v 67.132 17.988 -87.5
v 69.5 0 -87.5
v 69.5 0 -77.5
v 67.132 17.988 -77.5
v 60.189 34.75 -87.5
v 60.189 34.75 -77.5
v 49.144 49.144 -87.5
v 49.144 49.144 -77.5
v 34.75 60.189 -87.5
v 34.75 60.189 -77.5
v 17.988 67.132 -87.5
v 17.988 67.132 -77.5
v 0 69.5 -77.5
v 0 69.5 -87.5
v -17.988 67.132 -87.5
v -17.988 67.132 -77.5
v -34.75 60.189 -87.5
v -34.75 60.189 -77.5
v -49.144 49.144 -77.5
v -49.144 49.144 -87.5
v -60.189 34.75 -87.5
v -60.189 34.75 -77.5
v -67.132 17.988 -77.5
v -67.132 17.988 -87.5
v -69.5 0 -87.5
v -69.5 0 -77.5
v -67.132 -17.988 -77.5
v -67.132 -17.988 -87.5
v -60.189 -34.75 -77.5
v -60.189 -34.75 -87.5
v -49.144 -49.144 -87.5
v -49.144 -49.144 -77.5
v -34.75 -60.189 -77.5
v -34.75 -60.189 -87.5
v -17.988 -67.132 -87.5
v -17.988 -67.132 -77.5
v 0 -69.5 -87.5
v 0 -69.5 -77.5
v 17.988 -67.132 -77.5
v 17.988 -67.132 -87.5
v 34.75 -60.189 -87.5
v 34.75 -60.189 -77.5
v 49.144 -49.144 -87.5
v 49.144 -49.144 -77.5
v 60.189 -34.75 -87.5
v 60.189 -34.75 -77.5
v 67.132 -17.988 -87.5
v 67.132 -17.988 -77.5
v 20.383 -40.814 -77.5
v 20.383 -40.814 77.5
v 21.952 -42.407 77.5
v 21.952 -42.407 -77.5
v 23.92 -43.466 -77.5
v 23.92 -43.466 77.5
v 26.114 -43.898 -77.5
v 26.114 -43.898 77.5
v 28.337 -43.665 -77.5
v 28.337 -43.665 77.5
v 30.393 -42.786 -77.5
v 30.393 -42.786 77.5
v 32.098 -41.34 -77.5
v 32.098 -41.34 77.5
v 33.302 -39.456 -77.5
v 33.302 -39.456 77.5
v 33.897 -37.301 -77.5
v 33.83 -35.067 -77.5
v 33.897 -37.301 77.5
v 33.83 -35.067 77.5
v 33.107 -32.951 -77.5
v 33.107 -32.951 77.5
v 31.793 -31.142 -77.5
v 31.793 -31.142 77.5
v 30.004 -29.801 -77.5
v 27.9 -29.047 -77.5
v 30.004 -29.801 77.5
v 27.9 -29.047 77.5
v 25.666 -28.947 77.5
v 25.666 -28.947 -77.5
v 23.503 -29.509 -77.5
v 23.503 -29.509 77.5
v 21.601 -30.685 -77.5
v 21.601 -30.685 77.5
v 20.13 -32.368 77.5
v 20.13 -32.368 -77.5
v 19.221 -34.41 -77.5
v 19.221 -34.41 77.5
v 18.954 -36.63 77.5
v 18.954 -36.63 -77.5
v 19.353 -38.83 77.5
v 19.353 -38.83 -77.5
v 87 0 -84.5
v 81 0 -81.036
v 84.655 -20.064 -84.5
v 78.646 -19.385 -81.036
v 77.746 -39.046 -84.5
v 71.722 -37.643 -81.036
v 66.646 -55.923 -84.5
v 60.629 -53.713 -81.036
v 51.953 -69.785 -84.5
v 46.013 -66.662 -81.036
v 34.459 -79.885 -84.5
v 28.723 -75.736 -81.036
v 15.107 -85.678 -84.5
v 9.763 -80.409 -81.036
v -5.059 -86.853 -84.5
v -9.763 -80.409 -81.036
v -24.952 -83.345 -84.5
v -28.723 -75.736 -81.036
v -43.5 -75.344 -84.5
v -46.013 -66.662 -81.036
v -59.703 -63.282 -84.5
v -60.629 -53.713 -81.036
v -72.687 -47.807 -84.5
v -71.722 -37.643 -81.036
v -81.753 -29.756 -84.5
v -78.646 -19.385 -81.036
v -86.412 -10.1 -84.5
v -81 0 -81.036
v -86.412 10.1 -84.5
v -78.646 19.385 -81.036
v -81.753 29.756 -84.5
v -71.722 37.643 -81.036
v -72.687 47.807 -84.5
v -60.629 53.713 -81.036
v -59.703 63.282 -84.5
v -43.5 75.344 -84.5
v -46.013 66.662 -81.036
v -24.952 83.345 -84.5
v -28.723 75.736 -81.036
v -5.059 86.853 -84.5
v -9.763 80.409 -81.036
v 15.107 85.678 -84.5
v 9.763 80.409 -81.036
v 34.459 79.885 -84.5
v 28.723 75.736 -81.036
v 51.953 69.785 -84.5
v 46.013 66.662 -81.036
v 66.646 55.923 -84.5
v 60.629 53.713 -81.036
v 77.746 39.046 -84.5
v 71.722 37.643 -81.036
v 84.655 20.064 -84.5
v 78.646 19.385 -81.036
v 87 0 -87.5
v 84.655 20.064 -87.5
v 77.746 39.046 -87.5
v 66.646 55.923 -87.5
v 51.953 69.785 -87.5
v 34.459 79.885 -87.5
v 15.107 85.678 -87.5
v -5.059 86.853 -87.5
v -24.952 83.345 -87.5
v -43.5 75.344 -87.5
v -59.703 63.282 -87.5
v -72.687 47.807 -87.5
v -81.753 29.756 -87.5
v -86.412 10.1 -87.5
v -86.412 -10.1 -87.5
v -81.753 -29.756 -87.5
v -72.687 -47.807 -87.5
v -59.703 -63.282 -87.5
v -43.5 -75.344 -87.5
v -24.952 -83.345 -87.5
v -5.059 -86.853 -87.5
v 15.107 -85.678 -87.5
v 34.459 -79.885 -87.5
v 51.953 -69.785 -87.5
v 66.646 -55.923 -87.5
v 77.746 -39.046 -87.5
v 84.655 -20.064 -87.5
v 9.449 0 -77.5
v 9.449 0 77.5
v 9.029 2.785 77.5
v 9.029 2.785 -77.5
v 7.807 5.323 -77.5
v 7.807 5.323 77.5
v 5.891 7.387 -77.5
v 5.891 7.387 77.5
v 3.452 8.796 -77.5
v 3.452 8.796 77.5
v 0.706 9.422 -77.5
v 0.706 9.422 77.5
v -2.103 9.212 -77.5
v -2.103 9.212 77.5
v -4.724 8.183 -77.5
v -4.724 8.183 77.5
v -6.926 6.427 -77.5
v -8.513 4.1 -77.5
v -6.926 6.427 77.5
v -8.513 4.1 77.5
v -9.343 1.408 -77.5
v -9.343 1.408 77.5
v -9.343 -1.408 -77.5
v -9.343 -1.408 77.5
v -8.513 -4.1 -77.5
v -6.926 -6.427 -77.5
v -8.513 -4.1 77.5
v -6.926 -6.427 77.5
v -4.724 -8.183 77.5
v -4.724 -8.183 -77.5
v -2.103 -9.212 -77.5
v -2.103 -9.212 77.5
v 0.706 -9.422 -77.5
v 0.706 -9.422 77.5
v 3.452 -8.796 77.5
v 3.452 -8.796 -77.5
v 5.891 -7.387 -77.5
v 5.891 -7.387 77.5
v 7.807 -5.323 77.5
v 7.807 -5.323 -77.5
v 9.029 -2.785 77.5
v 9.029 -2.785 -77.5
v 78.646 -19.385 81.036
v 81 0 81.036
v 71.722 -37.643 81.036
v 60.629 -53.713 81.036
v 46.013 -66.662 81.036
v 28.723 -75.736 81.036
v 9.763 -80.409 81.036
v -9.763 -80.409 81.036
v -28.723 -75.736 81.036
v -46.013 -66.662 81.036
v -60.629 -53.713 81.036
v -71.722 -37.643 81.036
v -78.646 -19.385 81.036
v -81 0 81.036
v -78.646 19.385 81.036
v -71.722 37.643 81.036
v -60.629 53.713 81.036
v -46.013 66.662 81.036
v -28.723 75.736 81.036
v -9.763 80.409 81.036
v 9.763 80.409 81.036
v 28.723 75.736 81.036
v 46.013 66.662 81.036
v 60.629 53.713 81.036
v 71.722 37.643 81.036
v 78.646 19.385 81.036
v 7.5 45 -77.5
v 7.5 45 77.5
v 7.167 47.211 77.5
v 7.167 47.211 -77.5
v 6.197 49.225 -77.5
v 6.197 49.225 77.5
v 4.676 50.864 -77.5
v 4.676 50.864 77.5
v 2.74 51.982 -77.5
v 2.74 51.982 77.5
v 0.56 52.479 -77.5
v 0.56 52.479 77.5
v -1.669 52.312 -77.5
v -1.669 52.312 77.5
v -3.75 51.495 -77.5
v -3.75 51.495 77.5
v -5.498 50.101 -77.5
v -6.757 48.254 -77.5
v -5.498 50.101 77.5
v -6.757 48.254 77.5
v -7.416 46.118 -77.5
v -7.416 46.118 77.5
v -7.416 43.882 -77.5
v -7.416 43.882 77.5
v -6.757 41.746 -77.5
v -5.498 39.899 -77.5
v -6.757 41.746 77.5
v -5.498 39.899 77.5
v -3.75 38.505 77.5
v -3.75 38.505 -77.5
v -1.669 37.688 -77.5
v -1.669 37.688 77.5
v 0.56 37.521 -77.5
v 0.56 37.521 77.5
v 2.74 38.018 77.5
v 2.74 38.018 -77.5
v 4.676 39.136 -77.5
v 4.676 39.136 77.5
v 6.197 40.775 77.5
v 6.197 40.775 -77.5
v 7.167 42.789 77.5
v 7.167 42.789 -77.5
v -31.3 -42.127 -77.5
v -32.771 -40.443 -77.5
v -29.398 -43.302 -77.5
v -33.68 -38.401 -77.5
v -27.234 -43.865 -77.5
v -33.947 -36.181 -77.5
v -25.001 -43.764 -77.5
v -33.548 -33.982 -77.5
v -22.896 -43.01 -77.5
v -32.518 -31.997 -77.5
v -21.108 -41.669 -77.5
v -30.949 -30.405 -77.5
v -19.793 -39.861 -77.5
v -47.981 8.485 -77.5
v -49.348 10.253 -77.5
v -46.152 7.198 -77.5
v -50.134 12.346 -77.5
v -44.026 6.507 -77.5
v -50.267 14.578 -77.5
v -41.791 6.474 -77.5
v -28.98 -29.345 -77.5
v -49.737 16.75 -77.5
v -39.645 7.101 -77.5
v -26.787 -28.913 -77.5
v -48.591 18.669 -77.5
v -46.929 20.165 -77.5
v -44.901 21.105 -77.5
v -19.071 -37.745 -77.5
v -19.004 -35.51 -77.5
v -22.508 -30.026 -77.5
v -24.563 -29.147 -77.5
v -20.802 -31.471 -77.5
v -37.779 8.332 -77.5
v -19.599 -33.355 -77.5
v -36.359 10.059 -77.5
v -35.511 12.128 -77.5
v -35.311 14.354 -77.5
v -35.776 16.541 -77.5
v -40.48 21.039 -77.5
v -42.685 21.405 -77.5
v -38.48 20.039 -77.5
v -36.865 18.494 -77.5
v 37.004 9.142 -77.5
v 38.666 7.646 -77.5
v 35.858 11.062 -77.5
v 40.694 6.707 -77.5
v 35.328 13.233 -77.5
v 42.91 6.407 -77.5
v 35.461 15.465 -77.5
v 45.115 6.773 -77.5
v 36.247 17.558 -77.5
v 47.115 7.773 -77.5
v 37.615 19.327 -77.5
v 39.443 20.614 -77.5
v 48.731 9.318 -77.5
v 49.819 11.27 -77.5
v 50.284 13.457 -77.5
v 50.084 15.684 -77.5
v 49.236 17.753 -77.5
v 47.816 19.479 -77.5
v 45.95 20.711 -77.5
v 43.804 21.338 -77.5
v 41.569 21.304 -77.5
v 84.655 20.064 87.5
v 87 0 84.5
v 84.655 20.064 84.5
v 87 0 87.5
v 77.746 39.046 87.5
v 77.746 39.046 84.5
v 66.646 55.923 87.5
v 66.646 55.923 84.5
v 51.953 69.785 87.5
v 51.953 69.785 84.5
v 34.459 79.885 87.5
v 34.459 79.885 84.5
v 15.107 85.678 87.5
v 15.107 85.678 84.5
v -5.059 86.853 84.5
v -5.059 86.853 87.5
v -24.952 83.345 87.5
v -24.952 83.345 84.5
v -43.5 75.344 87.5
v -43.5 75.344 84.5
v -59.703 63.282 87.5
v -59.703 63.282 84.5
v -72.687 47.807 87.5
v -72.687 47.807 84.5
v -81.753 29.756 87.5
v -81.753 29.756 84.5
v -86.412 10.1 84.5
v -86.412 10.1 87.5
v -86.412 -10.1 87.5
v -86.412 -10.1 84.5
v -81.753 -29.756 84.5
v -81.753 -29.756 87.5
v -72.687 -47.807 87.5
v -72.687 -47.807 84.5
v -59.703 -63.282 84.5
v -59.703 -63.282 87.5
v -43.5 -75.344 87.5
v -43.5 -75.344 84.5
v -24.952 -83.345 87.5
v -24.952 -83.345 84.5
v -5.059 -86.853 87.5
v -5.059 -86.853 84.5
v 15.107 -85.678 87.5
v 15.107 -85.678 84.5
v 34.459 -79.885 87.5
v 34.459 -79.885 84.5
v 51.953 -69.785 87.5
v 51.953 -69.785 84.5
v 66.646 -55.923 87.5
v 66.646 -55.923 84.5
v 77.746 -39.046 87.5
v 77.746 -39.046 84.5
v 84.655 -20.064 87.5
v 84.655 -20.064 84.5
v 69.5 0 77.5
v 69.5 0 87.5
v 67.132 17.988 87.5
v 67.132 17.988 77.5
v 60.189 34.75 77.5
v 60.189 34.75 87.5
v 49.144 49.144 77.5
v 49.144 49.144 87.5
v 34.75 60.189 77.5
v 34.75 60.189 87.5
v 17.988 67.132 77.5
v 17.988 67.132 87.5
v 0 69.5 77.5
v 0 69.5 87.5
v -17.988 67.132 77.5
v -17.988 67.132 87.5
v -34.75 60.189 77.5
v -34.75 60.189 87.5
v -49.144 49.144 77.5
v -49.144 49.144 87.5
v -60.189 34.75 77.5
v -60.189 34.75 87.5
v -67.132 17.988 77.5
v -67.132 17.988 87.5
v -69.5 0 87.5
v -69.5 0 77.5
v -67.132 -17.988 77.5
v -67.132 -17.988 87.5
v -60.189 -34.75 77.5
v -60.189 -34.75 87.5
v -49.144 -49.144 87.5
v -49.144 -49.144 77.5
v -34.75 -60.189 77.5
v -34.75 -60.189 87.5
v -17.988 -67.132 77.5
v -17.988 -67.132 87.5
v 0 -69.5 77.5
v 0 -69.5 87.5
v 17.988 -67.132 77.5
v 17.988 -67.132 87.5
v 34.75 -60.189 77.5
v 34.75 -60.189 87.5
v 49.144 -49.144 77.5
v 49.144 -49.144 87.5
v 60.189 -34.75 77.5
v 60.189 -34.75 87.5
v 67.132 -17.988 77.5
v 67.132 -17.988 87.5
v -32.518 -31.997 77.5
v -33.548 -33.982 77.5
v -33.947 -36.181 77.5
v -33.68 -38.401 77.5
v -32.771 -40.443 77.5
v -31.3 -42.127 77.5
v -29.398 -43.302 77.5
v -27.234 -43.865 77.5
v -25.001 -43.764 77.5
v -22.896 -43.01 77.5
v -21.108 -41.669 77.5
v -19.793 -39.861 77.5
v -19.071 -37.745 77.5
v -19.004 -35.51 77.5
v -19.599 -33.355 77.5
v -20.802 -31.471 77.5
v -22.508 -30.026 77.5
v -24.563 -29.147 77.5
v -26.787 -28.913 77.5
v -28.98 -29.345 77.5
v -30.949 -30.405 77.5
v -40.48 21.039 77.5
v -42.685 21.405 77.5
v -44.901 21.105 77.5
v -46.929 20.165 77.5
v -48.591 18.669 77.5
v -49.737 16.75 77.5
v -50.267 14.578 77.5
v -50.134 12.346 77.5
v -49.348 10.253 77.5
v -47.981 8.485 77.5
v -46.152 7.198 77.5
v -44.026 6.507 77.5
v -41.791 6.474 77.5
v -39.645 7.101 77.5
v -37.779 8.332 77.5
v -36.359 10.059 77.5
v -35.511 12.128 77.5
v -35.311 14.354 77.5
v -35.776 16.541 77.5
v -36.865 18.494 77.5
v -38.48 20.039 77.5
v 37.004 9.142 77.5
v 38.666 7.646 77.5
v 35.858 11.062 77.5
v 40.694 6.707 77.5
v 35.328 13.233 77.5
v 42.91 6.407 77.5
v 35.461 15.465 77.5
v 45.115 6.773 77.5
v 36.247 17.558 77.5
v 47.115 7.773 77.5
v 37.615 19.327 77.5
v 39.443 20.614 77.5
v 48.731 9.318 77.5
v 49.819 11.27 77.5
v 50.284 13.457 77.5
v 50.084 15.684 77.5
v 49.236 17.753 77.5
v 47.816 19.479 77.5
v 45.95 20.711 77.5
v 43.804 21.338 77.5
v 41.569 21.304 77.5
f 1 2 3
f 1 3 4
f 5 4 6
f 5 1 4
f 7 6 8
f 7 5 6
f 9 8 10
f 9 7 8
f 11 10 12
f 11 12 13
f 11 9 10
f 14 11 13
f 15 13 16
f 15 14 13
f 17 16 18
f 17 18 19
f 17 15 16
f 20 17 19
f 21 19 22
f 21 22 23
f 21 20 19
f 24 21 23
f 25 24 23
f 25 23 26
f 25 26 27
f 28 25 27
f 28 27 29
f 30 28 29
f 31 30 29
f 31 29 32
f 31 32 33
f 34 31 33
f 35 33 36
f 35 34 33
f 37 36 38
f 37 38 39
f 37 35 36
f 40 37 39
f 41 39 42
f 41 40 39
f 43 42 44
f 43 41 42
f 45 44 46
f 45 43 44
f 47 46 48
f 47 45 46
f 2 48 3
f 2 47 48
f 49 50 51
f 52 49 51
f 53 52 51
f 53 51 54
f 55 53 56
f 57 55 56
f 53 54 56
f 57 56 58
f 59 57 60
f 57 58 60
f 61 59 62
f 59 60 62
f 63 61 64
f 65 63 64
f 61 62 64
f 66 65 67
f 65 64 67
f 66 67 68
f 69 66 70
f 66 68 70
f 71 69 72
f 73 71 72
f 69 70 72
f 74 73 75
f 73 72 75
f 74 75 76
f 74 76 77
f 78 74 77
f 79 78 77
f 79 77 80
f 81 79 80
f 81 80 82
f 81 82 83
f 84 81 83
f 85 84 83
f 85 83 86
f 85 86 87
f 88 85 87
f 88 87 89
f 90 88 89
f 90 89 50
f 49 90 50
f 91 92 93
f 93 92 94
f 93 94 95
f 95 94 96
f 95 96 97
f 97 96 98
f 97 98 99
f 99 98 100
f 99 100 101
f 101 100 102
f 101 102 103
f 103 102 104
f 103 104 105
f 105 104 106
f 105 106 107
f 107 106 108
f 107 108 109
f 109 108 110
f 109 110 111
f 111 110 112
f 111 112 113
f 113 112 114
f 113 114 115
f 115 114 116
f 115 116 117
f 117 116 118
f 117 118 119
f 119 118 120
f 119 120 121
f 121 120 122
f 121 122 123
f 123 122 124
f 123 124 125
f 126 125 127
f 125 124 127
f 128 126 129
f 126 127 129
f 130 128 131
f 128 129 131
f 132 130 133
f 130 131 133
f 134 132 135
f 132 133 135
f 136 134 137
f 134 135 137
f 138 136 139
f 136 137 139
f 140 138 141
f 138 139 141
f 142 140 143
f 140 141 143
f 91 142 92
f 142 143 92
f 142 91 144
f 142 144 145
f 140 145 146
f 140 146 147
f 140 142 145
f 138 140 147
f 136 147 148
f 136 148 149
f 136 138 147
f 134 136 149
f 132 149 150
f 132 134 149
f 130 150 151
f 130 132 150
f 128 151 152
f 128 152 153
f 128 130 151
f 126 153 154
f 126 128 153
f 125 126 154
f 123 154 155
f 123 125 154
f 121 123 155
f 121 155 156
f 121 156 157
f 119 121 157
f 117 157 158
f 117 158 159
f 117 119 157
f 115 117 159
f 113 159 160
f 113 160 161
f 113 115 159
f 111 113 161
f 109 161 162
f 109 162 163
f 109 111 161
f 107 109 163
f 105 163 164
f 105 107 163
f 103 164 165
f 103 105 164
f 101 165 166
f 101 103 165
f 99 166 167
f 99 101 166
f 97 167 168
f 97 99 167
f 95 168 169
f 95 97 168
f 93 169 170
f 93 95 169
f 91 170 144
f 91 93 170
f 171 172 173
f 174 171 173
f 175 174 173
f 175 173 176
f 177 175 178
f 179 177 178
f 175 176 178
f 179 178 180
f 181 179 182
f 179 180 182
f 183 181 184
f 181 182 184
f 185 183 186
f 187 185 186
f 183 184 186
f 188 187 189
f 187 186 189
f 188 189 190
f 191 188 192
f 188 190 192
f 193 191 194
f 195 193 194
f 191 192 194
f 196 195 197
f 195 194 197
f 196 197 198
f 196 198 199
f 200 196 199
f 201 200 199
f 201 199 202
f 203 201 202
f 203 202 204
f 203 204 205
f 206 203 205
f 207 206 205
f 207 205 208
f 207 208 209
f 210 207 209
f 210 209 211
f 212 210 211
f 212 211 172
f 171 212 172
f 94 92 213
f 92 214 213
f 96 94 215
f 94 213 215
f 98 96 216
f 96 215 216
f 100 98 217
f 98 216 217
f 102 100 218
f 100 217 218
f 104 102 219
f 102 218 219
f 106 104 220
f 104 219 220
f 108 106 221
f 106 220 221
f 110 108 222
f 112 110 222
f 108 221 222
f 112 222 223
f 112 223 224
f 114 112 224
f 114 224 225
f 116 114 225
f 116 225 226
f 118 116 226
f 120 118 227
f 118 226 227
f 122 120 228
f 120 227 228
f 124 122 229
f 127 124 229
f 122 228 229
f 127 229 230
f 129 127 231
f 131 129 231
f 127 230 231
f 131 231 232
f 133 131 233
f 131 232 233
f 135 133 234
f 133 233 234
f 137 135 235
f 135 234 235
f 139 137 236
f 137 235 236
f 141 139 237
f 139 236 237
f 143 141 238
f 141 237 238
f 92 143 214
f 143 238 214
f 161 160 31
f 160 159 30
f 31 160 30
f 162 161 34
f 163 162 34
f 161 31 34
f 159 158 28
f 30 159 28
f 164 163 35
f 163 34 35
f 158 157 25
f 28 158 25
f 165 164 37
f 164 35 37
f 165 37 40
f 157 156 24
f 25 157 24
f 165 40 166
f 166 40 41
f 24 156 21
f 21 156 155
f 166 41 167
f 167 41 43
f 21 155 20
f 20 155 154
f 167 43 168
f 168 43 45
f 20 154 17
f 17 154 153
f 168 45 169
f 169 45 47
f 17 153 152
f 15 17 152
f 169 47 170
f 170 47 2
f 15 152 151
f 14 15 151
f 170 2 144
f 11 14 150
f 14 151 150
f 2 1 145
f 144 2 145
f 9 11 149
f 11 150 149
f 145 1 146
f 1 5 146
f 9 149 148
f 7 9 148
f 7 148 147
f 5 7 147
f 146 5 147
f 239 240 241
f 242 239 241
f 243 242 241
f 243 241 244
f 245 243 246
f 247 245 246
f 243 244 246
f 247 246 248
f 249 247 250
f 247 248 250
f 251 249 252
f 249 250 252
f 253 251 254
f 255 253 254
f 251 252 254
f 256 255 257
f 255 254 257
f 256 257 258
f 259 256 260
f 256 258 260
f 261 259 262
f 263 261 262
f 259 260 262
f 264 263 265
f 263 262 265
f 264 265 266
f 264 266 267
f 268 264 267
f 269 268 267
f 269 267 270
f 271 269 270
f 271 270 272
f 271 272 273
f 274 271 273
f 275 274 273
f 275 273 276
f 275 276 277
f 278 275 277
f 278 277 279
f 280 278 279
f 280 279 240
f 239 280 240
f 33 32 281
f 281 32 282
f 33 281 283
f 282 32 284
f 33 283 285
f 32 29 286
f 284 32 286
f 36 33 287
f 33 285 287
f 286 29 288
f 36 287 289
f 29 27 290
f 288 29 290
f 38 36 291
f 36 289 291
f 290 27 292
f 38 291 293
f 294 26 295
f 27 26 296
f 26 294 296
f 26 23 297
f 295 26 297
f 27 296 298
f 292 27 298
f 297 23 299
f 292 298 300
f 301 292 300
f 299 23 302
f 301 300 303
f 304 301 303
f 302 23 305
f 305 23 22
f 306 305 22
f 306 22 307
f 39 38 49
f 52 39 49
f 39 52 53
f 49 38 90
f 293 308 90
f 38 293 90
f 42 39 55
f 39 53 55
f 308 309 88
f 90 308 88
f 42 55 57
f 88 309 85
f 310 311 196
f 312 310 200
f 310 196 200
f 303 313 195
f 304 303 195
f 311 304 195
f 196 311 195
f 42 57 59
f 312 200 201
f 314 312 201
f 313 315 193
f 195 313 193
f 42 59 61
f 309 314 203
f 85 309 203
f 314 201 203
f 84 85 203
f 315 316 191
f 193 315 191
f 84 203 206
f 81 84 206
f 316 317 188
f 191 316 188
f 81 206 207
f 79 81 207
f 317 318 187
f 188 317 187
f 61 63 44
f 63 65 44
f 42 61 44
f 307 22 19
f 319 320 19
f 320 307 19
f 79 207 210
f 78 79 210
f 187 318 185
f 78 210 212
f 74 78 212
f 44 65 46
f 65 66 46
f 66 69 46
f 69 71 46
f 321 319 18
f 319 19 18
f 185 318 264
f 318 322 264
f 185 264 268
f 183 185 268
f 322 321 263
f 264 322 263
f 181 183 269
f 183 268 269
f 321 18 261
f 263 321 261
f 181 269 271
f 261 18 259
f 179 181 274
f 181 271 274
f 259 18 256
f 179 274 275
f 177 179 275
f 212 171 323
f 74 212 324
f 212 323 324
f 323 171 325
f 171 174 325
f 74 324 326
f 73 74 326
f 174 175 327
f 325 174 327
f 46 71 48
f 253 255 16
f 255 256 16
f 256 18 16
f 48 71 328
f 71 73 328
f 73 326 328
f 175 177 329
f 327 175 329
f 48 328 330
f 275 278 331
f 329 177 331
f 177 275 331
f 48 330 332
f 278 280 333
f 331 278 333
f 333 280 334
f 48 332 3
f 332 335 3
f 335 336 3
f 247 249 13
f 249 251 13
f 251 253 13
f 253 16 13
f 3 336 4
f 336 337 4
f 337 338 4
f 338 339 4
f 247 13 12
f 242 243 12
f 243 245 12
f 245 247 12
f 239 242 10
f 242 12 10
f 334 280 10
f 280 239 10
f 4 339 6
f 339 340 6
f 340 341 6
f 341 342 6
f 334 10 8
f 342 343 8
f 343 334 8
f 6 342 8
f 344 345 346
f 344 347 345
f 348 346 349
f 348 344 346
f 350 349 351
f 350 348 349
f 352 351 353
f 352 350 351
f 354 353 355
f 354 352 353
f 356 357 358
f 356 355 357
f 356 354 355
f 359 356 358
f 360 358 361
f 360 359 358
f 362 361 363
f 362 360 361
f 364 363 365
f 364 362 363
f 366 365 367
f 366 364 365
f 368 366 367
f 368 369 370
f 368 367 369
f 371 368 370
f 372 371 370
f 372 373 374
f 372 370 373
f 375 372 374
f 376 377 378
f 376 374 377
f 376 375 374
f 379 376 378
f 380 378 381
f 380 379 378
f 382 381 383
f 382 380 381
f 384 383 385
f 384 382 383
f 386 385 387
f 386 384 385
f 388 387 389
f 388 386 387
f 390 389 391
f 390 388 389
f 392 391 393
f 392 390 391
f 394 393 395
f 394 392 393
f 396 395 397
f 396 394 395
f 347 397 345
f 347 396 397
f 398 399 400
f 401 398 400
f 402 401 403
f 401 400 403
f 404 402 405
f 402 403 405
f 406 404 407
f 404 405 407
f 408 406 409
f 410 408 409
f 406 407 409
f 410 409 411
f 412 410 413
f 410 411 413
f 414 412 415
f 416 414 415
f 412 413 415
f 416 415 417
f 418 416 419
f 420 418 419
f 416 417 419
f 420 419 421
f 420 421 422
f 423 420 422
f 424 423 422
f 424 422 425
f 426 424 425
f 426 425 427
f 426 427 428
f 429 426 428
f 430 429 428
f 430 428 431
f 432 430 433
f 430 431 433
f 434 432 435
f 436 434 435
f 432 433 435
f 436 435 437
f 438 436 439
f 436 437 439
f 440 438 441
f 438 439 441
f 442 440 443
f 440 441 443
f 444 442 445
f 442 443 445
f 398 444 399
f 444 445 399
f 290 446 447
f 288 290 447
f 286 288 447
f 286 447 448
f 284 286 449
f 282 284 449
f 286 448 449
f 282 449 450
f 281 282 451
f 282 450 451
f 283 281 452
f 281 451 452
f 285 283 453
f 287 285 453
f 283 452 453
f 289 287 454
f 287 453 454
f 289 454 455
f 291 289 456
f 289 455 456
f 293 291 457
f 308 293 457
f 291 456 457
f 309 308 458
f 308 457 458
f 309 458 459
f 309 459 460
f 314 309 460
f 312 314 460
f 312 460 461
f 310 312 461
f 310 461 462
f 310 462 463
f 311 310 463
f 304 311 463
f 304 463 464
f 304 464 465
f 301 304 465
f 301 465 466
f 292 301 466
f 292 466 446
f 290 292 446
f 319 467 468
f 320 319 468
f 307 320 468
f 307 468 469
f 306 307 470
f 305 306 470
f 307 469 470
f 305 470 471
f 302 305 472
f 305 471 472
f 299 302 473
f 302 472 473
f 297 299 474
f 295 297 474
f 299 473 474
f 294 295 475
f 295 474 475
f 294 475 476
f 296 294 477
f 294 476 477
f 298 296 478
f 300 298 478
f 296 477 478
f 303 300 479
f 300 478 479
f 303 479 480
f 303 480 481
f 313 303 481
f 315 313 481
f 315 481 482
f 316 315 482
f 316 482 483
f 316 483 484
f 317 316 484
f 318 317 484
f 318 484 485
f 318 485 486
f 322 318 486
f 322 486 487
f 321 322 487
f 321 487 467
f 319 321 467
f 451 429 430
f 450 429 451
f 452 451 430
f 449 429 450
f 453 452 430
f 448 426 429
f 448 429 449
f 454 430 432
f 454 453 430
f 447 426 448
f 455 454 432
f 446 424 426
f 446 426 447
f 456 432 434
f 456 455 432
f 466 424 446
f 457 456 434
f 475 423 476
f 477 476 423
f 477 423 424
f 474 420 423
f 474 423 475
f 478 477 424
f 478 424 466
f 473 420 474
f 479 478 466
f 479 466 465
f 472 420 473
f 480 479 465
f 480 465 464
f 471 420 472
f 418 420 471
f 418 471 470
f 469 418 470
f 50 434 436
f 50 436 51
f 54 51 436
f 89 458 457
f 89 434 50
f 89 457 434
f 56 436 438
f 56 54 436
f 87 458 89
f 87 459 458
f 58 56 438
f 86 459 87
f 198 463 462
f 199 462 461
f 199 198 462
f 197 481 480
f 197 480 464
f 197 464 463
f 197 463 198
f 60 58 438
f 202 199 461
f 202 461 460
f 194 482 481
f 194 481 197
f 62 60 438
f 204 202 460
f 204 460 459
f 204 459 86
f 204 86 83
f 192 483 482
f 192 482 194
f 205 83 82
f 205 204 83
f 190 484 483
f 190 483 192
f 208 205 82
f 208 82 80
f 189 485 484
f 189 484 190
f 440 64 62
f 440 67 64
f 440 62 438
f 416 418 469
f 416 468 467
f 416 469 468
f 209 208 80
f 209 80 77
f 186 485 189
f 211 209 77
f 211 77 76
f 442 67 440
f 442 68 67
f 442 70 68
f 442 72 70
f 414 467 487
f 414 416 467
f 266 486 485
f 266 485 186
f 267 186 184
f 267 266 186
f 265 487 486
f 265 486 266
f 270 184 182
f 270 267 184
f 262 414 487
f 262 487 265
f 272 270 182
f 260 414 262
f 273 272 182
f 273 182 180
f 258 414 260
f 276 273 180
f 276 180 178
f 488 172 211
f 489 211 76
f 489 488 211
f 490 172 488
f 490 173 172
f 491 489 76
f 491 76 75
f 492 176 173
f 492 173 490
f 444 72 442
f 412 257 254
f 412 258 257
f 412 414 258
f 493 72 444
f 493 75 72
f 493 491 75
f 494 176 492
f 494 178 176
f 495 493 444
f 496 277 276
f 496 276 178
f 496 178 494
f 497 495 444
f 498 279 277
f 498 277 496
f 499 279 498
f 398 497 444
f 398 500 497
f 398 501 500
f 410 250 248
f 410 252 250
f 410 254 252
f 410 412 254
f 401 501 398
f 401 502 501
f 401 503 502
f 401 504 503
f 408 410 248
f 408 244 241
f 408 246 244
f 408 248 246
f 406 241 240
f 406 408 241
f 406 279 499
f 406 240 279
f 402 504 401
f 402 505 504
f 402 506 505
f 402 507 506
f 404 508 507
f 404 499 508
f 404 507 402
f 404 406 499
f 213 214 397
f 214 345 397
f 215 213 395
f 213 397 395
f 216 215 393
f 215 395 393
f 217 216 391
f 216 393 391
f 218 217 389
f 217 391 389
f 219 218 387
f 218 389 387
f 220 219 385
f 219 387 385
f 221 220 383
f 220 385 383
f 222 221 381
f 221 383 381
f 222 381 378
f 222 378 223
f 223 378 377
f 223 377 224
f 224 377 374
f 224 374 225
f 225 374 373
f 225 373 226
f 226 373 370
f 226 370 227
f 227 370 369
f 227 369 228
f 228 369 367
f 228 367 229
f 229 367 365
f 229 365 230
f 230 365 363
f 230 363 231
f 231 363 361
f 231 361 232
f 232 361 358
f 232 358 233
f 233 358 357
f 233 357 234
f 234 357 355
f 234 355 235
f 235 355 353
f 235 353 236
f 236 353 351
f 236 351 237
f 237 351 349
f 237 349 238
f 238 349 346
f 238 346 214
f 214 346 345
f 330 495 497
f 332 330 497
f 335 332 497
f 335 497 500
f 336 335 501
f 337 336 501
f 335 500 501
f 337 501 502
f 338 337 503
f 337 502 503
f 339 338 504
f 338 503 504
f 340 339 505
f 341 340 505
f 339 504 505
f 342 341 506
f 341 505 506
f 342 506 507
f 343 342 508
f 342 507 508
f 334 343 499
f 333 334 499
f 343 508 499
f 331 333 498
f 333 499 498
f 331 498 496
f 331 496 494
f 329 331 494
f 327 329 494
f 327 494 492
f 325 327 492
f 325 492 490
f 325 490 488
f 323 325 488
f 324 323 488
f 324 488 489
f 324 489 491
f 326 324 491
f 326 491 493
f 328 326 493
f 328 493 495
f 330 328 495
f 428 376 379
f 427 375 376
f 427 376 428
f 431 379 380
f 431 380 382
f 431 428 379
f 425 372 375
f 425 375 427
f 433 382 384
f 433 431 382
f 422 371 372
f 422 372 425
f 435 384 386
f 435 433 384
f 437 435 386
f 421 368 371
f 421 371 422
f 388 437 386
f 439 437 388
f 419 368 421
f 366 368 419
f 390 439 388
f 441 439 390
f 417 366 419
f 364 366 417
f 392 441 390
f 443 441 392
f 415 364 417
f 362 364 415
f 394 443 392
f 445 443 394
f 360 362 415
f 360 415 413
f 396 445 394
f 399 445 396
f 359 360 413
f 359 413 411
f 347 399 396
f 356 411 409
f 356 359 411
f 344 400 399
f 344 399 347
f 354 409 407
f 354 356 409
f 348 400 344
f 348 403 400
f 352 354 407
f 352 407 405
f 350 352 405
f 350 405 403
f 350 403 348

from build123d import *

# Parameters (mm, degrees)
SKETCH1_R               = 87
BOSS_EXTRUDE1_DEPTH     = 87.5
SKETCH2_R               = 9.4488
CUT_EXTRUDE1_DEPTH      = 1
CUT_EXTRUDE1_DEPTH_BACK = 176
SKETCH3_R               = 69.5
CUT_EXTRUDE2_DEPTH      = 10
SKETCH7_R               = 7.5
CUT_EXTRUDE3_DEPTH      = 166
CIRPATTERN1_COUNT       = 5


with BuildPart() as part:
    # Sketch1 → Boss-Extrude1 (new body, symmetric)
    with BuildSketch(Plane.XY):
        Circle(SKETCH1_R)
    extrude(amount=BOSS_EXTRUDE1_DEPTH, both=True)

    # Sketch2 → Cut-Extrude1 (cut, two sides)
    with BuildSketch(Plane.XY.offset(87.5)) as cut_extrude1_sk:
        Circle(SKETCH2_R)
    extrude(amount=CUT_EXTRUDE1_DEPTH, mode=Mode.SUBTRACT)
    extrude(cut_extrude1_sk.sketch, amount=-CUT_EXTRUDE1_DEPTH_BACK, mode=Mode.SUBTRACT)

    # Sketch3 → Cut-Extrude2 (cut)
    with BuildSketch(Plane.XY.offset(87.5)):
        Circle(SKETCH3_R)
    cut_extrude2 = extrude(amount=-CUT_EXTRUDE2_DEPTH, mode=Mode.SUBTRACT)

    # Mirror1: Cut-Extrude2 across plane
    add(cut_extrude2.mirror(Plane.XY), mode=Mode.SUBTRACT)

    # Sketch5 → Cut-Revolve1 (revolve, cut)
    with BuildSketch(Plane(origin=(0, 0, 0), x_dir=(1, 0, 0), z_dir=(0, 1, 0))):
        Polygon((87, 84.5), (81, 81.035898385), (81, -81.035898385), (87, -84.5), align=None)
    revolve(axis=Axis((0, 0, 0), (0, 0, -1)), mode=Mode.SUBTRACT)

    # Sketch7 → Cut-Extrude3 (cut, through all)
    with BuildSketch(Plane.XY.offset(77.5)):
        with Locations((0, 45)):
            Circle(SKETCH7_R)
    cut_extrude3 = extrude(amount=-CUT_EXTRUDE3_DEPTH, mode=Mode.SUBTRACT)

    # CirPattern1: Cut-Extrude3 ×5 about axis
    cirpattern1_axis = Axis((0, 0, 0), (0, 0, 1))
    for i in range(1, CIRPATTERN1_COUNT):
        add(cut_extrude3.rotate(cirpattern1_axis, i * 360 / CIRPATTERN1_COUNT), mode=Mode.SUBTRACT)


solid = part.part
